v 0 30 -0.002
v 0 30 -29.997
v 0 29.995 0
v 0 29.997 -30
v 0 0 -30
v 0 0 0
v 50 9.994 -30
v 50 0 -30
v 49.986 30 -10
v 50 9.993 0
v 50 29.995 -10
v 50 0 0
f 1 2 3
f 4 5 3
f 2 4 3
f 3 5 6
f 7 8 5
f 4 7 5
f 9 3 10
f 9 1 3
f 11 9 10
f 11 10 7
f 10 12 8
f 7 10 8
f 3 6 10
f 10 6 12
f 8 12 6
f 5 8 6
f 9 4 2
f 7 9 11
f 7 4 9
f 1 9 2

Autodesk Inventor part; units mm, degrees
ref_plane "YZ Plane" through (0, 0, 0) normal (1, 0, 0) x (0, 1, 0)
sketch "草圖1" plane through (0, 0, 0) normal (0, 1, 0) x (-1, 0, 0)
  line L0 (0, 0) -> (-50, 0)
  line L1 (-50, 0) -> (-50, -30)
  line L2 (-50, -30) -> (0, -30)
  line L3 (0, -30) -> (0, 0)
  dimension "d0" = 30
  dimension "d1" = 50
extrude "擠出1" add sketch "草圖1" along normal blind 30
sketch "草圖2" plane through (50, 0, 0) normal (1, 0, 0) x (0, 0, -1)
  line L0 (0, 0) -> (0, 30) projected
  line L1 (0, 10) -> (10, 30)
  line L2 (0, 30) -> (30, 30) projected
  dimension "d4" = 10
  dimension "d5" = 20
ref_plane "工作平面1" through (0, 30, 0) normal (0.1761, 0.4402, 0.8805) x (0.9285, -0.3714, 0)
sketch "草圖3" plane through (0, 30, 0) normal (0.1761, 0.4402, 0.8805) x (0.9285, -0.3714, 0)
  line L0 (-15.4491, 27.3305) -> (88.7028, 27.3305)
  line L1 (88.7028, 27.3305) -> (88.7028, -20.9863)
  line L2 (88.7028, -20.9863) -> (-15.4491, -20.9863)
  line L3 (-15.4491, -20.9863) -> (-15.4491, 27.3305)
  point P0 (11.1417, -24.5243)
extrude "擠出2" cut sketch "草圖3" along normal blind 30
sketch "草圖4" plane through (50, 0, 0) normal (1, 0, 0) x (0, 0, -1)
  line L0 (30, 0) -> (30, 30) projected
  point P0 (0, 0)
  point P1 (30, 10)
  dimension "d8" = 20
ref_plane "工作平面2" through (0, 30, -30) normal (0.2722, 0.6804, -0.6804) x (0.9285, 0, 0.3714)
sketch "草圖5" plane through (0, 30, -30) normal (0.2722, 0.6804, -0.6804) x (0.9285, 0, 0.3714)
  line L0 (63.1624, -12.2255) -> (-24.2943, -12.2255)
  line L1 (-24.2943, -12.2255) -> (-24.2943, 28.5728)
  line L2 (-24.2943, 28.5728) -> (63.1624, 28.5728)
  line L3 (63.1624, 28.5728) -> (63.1624, -12.2255)
  point P0 (11.1417, 3.0324)
extrude "擠出3" cut sketch "草圖5" along normal blind 30
properties part number "40"
